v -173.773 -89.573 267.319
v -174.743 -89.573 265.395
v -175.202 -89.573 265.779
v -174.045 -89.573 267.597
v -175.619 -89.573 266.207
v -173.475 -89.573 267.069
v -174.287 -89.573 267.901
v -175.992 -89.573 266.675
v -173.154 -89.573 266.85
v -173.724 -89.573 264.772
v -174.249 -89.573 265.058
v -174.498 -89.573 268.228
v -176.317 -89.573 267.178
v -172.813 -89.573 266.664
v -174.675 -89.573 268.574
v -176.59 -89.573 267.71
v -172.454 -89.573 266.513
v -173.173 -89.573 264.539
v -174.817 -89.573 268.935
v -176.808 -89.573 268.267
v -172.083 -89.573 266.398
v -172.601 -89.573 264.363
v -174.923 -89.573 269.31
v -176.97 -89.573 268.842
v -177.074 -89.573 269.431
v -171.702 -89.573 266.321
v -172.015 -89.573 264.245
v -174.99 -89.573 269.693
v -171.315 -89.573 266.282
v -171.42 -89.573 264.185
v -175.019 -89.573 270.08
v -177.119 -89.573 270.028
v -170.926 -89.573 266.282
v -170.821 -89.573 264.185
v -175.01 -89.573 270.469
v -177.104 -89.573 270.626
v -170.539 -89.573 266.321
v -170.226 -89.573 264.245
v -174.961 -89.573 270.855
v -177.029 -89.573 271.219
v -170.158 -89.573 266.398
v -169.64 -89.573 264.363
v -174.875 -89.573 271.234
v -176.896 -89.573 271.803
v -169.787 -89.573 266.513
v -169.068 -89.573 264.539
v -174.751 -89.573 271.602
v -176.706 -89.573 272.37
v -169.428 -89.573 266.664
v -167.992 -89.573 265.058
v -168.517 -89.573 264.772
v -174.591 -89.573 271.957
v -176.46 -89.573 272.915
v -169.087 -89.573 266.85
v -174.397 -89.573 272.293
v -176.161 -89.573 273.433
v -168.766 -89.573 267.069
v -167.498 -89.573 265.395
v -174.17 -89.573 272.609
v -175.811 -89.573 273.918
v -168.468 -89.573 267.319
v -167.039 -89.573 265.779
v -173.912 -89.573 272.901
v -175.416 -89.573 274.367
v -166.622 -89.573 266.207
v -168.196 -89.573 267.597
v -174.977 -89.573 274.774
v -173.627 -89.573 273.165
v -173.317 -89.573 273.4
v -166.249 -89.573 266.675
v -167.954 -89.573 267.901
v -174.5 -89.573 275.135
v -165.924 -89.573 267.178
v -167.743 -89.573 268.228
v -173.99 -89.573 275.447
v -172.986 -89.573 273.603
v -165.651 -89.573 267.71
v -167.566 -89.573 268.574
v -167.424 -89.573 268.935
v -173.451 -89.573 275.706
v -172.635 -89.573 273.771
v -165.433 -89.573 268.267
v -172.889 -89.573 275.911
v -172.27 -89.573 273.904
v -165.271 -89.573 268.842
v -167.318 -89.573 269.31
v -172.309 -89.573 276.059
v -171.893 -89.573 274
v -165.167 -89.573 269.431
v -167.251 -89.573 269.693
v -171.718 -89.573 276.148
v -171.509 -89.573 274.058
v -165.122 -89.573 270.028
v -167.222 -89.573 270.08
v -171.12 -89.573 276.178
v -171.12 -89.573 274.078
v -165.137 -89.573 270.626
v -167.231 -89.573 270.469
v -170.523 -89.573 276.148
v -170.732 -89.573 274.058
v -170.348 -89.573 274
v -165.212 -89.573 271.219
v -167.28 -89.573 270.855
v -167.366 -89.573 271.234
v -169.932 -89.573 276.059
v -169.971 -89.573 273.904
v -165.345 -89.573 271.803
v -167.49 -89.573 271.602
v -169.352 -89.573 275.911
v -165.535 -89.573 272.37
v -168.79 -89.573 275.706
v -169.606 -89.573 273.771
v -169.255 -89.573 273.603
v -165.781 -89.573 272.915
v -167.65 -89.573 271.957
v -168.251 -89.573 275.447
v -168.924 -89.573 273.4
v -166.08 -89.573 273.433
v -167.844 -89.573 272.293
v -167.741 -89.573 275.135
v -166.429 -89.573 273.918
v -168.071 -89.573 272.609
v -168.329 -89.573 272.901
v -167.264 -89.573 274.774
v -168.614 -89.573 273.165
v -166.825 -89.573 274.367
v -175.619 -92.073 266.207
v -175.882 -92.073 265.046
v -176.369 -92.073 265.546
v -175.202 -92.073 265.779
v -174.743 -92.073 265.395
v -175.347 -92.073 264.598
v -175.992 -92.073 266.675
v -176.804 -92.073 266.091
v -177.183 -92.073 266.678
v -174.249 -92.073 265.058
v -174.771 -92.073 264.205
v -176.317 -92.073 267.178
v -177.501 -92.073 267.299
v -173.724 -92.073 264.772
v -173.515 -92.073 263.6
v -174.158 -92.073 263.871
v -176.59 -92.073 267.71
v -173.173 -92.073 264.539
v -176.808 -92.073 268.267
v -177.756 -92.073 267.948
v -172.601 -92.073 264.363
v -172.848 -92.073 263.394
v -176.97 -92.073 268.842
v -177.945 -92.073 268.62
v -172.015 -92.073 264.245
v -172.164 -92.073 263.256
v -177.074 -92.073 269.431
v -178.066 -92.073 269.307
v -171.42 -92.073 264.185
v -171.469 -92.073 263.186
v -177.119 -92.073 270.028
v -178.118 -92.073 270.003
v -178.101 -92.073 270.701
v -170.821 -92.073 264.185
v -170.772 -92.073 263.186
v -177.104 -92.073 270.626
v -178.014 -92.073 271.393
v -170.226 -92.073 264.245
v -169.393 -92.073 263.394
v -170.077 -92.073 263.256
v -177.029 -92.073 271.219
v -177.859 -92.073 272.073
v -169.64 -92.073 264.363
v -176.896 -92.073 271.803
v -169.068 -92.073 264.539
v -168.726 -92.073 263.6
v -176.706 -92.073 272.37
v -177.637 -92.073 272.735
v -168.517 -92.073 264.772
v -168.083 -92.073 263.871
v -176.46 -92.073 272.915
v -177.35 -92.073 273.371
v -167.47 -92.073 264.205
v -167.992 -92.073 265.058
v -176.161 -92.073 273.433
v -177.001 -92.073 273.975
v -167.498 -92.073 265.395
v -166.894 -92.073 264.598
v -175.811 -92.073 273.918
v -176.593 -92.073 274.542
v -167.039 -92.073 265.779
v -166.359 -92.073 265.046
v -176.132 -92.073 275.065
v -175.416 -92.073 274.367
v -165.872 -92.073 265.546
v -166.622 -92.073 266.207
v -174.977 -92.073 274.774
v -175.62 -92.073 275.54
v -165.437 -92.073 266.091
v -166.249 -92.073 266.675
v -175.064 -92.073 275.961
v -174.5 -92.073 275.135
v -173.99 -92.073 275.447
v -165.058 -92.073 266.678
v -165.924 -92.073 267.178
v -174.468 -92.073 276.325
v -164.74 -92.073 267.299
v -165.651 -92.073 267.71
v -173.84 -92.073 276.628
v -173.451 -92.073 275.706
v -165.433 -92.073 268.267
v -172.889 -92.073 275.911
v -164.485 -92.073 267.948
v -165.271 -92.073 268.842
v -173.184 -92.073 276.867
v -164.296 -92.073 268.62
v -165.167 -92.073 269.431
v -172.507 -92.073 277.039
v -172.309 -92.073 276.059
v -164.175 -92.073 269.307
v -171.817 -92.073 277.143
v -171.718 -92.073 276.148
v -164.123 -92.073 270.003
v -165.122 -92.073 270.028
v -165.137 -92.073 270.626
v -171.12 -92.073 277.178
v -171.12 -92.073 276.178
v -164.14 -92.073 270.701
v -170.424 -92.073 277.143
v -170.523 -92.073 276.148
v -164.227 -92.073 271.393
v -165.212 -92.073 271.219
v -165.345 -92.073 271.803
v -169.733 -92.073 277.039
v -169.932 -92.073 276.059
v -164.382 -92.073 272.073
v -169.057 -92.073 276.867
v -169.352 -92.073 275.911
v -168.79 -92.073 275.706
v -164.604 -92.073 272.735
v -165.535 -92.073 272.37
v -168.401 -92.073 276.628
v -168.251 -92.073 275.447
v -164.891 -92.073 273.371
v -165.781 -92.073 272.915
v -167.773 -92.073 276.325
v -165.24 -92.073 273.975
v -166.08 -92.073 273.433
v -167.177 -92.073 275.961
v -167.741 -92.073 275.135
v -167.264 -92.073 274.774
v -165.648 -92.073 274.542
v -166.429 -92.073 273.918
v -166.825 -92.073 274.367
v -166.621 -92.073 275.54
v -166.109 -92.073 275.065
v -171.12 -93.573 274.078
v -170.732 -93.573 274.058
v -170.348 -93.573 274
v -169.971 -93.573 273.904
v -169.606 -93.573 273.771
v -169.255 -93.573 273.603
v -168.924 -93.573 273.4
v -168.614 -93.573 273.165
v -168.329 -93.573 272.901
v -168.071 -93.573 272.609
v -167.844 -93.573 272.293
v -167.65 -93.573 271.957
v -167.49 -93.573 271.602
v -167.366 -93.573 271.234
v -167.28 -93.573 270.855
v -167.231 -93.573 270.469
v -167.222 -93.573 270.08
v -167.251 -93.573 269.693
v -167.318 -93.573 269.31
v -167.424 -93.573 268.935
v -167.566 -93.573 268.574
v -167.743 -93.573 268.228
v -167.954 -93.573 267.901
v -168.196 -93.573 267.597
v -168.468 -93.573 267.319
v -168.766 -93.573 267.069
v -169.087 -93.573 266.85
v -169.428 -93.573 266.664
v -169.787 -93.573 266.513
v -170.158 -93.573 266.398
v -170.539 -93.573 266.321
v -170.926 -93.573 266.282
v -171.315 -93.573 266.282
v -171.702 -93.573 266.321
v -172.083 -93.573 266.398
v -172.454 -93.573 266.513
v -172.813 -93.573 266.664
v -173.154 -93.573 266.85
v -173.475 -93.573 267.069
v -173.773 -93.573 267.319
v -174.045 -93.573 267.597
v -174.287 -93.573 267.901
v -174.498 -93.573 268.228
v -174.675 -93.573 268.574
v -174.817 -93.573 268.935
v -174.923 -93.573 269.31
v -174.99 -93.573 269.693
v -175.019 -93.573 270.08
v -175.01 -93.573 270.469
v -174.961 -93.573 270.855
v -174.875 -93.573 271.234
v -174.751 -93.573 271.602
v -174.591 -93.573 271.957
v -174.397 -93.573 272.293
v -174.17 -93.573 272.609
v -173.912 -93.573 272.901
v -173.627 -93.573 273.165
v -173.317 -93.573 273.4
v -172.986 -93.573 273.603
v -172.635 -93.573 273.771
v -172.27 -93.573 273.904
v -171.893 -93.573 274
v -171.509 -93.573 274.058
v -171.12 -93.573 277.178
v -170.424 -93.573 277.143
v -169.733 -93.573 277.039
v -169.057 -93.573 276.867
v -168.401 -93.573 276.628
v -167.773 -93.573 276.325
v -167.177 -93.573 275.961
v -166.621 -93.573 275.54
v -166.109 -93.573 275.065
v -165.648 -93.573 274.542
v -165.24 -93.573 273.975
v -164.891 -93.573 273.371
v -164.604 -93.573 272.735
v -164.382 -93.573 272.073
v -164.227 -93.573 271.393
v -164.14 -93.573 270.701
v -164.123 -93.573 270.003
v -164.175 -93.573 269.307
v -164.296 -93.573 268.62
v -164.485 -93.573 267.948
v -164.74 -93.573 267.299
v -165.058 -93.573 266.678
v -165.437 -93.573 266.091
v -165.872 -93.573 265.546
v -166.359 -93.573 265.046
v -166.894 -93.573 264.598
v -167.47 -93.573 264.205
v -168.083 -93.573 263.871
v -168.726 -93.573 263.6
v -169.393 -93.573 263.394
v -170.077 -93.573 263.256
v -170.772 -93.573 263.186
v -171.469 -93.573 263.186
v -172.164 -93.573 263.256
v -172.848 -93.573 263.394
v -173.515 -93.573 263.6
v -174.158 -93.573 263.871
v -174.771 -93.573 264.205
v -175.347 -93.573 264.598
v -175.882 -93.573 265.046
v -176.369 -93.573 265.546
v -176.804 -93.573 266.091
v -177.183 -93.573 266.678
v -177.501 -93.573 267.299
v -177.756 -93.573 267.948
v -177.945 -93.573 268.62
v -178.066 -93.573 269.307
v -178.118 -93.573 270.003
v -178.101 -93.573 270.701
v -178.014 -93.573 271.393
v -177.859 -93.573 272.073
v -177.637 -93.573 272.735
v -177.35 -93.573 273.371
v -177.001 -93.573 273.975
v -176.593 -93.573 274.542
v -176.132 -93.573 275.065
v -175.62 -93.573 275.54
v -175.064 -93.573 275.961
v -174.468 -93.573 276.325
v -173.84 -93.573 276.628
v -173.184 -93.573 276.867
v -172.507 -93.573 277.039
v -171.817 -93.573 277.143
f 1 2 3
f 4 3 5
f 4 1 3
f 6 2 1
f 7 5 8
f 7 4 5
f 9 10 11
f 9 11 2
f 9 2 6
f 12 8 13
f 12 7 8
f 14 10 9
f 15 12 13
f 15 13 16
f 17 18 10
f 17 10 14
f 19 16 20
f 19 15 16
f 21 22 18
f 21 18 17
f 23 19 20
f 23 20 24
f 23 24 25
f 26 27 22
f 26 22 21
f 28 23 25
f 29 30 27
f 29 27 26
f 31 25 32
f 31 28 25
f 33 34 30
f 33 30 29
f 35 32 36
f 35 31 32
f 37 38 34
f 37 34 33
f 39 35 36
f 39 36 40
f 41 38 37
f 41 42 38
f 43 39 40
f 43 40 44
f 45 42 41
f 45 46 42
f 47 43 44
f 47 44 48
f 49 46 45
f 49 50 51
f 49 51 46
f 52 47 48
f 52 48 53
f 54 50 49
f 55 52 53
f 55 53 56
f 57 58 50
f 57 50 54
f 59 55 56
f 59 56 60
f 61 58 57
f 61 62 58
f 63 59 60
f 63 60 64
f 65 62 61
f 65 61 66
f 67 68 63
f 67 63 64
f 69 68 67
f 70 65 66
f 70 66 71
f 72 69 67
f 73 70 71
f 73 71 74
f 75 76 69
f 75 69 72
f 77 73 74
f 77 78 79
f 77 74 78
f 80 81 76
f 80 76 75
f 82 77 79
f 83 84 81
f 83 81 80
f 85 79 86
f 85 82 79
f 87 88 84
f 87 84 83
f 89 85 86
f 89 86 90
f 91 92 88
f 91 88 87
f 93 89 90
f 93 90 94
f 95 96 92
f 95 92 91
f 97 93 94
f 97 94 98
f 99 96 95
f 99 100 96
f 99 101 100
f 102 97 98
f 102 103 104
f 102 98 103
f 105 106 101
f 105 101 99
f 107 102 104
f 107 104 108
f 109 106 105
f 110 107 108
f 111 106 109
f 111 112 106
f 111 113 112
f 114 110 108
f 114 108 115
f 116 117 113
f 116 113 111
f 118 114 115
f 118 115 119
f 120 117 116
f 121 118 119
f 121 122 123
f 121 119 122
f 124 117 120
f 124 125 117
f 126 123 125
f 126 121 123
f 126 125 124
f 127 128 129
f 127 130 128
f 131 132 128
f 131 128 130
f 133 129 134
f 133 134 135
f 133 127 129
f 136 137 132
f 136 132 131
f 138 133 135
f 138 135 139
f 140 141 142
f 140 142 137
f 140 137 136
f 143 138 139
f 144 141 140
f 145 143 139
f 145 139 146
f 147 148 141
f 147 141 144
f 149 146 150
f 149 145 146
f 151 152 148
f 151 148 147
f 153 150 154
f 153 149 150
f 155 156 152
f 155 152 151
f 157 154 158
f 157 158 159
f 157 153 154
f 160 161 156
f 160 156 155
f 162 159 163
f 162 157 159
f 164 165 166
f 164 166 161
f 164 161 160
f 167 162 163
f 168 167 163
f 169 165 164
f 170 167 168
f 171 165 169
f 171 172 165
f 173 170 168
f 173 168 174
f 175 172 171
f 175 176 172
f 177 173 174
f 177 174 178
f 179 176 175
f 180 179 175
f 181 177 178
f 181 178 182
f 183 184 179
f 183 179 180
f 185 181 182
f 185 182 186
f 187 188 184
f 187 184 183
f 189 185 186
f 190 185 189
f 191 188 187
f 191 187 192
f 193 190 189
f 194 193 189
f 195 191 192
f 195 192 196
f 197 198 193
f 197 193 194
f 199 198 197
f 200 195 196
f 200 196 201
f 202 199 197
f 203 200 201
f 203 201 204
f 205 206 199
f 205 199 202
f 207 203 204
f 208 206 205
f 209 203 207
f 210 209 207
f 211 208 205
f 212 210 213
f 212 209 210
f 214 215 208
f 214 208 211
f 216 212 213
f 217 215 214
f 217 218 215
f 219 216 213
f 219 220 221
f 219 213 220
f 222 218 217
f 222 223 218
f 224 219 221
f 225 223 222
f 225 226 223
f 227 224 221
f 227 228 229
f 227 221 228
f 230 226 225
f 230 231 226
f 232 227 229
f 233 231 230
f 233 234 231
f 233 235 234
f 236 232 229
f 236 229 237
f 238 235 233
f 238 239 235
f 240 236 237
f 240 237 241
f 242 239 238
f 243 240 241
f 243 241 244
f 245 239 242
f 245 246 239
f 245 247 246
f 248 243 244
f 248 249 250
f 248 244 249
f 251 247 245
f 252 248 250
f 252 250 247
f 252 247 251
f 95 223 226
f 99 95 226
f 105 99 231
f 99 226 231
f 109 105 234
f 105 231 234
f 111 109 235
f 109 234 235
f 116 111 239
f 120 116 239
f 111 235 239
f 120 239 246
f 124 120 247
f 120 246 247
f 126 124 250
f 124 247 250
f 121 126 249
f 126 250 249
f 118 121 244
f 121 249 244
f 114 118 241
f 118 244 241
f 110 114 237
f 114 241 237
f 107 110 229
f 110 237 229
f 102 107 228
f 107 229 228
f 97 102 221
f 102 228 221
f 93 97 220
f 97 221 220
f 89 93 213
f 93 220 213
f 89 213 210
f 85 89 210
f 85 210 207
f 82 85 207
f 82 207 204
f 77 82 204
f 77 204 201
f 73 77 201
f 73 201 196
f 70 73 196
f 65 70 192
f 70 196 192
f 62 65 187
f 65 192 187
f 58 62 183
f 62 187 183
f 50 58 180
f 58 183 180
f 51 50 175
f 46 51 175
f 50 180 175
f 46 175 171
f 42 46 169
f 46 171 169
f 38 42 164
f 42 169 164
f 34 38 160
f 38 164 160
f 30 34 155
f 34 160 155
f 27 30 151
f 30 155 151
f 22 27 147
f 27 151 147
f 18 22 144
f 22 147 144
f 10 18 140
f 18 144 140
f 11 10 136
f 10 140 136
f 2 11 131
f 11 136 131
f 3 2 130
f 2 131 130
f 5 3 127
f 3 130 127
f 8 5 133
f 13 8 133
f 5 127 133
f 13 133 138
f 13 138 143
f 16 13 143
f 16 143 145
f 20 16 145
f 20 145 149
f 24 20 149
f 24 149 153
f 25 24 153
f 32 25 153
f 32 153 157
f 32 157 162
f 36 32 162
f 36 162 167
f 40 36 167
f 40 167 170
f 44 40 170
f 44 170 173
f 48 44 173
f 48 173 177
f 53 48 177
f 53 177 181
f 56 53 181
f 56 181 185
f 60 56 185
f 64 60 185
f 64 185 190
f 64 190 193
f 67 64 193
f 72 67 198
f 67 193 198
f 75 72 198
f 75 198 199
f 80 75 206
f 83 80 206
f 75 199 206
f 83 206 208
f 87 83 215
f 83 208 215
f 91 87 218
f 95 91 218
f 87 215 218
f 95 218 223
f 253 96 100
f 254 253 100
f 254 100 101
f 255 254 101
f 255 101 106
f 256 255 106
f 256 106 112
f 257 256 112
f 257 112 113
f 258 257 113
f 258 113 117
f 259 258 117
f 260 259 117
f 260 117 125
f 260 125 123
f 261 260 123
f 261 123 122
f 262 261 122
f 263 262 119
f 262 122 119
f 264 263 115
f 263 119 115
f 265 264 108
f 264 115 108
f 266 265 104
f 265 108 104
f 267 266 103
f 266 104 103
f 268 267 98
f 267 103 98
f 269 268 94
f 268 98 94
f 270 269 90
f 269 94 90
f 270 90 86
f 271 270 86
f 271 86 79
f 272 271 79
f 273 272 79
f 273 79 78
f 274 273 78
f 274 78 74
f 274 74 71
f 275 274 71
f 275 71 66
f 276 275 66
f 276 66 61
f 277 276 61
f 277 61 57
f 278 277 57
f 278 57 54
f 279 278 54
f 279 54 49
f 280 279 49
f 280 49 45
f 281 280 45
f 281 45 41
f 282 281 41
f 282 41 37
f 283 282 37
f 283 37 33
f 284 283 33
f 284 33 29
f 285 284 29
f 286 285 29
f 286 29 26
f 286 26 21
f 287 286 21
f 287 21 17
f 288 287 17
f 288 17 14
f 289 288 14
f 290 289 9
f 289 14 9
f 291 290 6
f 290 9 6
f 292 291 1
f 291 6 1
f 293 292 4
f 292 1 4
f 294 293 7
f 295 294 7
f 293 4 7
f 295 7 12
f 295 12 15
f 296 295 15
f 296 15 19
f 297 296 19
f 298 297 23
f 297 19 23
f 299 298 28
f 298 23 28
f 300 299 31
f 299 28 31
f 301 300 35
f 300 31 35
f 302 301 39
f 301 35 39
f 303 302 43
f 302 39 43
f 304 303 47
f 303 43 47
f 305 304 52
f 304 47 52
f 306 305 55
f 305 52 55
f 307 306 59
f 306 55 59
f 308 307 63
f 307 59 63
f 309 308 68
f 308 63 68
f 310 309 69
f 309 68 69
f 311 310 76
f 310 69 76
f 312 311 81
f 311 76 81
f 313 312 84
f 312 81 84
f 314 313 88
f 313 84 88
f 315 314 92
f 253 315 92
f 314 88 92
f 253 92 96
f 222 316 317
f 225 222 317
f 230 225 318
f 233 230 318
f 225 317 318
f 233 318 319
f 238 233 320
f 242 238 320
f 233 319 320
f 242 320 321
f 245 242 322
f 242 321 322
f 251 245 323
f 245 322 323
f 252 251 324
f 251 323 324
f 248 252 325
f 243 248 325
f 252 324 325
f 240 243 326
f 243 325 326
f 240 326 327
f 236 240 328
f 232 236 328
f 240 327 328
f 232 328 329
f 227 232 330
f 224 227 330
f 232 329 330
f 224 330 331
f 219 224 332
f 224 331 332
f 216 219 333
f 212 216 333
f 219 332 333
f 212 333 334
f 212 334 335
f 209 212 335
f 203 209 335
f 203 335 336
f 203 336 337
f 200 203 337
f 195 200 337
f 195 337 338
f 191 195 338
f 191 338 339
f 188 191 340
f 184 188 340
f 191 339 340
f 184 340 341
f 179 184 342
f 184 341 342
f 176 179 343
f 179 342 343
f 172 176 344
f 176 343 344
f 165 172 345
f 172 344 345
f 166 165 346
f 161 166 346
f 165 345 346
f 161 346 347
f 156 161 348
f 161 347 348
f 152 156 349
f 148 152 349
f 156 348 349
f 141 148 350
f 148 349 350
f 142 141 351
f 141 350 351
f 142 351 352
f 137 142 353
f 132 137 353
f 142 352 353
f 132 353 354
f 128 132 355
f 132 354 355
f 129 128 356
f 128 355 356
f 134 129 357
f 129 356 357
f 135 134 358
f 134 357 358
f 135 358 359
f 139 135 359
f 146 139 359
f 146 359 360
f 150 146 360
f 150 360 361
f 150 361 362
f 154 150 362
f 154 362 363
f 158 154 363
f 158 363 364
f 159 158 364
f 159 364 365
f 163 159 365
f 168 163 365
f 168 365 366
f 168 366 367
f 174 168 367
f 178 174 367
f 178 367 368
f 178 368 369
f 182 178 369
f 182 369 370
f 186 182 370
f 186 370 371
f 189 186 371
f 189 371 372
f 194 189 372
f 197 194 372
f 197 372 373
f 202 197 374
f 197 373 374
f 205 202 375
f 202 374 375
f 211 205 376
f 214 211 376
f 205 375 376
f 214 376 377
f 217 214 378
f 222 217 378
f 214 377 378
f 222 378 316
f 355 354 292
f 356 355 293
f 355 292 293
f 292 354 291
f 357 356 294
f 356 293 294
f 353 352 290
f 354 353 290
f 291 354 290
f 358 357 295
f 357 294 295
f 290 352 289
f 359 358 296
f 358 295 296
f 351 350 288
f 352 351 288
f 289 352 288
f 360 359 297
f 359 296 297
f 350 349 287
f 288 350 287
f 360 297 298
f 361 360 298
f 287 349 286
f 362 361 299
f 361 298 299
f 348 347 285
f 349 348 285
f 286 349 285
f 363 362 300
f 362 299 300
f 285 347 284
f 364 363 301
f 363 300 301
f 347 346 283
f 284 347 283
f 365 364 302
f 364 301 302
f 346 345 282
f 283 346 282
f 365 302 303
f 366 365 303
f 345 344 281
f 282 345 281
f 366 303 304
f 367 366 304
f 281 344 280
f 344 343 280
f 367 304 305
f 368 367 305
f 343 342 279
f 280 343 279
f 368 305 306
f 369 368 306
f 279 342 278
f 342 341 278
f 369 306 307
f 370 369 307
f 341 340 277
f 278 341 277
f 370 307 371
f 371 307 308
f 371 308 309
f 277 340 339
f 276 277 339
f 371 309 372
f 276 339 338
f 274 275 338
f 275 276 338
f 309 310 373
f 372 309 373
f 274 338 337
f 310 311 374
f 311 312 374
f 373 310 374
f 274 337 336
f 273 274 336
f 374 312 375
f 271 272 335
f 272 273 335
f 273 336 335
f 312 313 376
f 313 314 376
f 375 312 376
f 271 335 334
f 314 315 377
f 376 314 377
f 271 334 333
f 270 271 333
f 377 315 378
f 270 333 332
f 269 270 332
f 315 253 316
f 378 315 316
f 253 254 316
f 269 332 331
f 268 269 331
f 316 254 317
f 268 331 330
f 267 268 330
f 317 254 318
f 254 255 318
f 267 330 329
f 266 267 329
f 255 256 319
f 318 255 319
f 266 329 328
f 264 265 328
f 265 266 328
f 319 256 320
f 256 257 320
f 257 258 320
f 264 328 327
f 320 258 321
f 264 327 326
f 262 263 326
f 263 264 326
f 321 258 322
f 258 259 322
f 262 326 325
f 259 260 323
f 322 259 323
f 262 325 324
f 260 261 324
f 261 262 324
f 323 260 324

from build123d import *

# Parameters (mm, degrees)
SKETCH_1_R          = 7
EXTRUDE_1_DEPTH     = 1.5
SKETCH_2_R          = 6
EXTRUDE_2_DEPTH     = 2.5
SKETCH_3_R          = 3.9
CUT_EXTRUDE_1_DEPTH = 11.677078252


with BuildPart() as part:
    # 草图1 → 凸台-拉伸1 (new body)
    with BuildSketch(Plane(origin=(0, 0, 0), x_dir=(1, 0, 0), z_dir=(0, 1, 0))):
        with Locations(Location((0, 0, 0), (0, 0, 270))):
            Circle(SKETCH_1_R)
    extrude(amount=EXTRUDE_1_DEPTH)

    # 草图2 → 凸台-拉伸2 (add)
    with BuildSketch(Plane(origin=(0, 1.5, 0), x_dir=(1, 0, 0), z_dir=(0, 1, 0))):
        with Locations(Location((0, 0, 0), (0, 0, 270))):
            Circle(SKETCH_2_R)
    extrude(amount=EXTRUDE_2_DEPTH)

    # 草图3 → 切除-拉伸1 (cut, through all)
    with BuildSketch(Plane(origin=(0, 4, 0), x_dir=(1, 0, 0), z_dir=(0, 1, 0))):
        with Locations(Location((0, 0, 0), (0, 0, 270))):
            Circle(SKETCH_3_R)
    extrude(amount=-CUT_EXTRUDE_1_DEPTH, mode=Mode.SUBTRACT)


with BuildPart() as part_1:
    # Move Body 1: moved
    add(part.part.moved(Location((-171.120476201, -93.573160839, 270.177536174))))


solid = part_1.part
